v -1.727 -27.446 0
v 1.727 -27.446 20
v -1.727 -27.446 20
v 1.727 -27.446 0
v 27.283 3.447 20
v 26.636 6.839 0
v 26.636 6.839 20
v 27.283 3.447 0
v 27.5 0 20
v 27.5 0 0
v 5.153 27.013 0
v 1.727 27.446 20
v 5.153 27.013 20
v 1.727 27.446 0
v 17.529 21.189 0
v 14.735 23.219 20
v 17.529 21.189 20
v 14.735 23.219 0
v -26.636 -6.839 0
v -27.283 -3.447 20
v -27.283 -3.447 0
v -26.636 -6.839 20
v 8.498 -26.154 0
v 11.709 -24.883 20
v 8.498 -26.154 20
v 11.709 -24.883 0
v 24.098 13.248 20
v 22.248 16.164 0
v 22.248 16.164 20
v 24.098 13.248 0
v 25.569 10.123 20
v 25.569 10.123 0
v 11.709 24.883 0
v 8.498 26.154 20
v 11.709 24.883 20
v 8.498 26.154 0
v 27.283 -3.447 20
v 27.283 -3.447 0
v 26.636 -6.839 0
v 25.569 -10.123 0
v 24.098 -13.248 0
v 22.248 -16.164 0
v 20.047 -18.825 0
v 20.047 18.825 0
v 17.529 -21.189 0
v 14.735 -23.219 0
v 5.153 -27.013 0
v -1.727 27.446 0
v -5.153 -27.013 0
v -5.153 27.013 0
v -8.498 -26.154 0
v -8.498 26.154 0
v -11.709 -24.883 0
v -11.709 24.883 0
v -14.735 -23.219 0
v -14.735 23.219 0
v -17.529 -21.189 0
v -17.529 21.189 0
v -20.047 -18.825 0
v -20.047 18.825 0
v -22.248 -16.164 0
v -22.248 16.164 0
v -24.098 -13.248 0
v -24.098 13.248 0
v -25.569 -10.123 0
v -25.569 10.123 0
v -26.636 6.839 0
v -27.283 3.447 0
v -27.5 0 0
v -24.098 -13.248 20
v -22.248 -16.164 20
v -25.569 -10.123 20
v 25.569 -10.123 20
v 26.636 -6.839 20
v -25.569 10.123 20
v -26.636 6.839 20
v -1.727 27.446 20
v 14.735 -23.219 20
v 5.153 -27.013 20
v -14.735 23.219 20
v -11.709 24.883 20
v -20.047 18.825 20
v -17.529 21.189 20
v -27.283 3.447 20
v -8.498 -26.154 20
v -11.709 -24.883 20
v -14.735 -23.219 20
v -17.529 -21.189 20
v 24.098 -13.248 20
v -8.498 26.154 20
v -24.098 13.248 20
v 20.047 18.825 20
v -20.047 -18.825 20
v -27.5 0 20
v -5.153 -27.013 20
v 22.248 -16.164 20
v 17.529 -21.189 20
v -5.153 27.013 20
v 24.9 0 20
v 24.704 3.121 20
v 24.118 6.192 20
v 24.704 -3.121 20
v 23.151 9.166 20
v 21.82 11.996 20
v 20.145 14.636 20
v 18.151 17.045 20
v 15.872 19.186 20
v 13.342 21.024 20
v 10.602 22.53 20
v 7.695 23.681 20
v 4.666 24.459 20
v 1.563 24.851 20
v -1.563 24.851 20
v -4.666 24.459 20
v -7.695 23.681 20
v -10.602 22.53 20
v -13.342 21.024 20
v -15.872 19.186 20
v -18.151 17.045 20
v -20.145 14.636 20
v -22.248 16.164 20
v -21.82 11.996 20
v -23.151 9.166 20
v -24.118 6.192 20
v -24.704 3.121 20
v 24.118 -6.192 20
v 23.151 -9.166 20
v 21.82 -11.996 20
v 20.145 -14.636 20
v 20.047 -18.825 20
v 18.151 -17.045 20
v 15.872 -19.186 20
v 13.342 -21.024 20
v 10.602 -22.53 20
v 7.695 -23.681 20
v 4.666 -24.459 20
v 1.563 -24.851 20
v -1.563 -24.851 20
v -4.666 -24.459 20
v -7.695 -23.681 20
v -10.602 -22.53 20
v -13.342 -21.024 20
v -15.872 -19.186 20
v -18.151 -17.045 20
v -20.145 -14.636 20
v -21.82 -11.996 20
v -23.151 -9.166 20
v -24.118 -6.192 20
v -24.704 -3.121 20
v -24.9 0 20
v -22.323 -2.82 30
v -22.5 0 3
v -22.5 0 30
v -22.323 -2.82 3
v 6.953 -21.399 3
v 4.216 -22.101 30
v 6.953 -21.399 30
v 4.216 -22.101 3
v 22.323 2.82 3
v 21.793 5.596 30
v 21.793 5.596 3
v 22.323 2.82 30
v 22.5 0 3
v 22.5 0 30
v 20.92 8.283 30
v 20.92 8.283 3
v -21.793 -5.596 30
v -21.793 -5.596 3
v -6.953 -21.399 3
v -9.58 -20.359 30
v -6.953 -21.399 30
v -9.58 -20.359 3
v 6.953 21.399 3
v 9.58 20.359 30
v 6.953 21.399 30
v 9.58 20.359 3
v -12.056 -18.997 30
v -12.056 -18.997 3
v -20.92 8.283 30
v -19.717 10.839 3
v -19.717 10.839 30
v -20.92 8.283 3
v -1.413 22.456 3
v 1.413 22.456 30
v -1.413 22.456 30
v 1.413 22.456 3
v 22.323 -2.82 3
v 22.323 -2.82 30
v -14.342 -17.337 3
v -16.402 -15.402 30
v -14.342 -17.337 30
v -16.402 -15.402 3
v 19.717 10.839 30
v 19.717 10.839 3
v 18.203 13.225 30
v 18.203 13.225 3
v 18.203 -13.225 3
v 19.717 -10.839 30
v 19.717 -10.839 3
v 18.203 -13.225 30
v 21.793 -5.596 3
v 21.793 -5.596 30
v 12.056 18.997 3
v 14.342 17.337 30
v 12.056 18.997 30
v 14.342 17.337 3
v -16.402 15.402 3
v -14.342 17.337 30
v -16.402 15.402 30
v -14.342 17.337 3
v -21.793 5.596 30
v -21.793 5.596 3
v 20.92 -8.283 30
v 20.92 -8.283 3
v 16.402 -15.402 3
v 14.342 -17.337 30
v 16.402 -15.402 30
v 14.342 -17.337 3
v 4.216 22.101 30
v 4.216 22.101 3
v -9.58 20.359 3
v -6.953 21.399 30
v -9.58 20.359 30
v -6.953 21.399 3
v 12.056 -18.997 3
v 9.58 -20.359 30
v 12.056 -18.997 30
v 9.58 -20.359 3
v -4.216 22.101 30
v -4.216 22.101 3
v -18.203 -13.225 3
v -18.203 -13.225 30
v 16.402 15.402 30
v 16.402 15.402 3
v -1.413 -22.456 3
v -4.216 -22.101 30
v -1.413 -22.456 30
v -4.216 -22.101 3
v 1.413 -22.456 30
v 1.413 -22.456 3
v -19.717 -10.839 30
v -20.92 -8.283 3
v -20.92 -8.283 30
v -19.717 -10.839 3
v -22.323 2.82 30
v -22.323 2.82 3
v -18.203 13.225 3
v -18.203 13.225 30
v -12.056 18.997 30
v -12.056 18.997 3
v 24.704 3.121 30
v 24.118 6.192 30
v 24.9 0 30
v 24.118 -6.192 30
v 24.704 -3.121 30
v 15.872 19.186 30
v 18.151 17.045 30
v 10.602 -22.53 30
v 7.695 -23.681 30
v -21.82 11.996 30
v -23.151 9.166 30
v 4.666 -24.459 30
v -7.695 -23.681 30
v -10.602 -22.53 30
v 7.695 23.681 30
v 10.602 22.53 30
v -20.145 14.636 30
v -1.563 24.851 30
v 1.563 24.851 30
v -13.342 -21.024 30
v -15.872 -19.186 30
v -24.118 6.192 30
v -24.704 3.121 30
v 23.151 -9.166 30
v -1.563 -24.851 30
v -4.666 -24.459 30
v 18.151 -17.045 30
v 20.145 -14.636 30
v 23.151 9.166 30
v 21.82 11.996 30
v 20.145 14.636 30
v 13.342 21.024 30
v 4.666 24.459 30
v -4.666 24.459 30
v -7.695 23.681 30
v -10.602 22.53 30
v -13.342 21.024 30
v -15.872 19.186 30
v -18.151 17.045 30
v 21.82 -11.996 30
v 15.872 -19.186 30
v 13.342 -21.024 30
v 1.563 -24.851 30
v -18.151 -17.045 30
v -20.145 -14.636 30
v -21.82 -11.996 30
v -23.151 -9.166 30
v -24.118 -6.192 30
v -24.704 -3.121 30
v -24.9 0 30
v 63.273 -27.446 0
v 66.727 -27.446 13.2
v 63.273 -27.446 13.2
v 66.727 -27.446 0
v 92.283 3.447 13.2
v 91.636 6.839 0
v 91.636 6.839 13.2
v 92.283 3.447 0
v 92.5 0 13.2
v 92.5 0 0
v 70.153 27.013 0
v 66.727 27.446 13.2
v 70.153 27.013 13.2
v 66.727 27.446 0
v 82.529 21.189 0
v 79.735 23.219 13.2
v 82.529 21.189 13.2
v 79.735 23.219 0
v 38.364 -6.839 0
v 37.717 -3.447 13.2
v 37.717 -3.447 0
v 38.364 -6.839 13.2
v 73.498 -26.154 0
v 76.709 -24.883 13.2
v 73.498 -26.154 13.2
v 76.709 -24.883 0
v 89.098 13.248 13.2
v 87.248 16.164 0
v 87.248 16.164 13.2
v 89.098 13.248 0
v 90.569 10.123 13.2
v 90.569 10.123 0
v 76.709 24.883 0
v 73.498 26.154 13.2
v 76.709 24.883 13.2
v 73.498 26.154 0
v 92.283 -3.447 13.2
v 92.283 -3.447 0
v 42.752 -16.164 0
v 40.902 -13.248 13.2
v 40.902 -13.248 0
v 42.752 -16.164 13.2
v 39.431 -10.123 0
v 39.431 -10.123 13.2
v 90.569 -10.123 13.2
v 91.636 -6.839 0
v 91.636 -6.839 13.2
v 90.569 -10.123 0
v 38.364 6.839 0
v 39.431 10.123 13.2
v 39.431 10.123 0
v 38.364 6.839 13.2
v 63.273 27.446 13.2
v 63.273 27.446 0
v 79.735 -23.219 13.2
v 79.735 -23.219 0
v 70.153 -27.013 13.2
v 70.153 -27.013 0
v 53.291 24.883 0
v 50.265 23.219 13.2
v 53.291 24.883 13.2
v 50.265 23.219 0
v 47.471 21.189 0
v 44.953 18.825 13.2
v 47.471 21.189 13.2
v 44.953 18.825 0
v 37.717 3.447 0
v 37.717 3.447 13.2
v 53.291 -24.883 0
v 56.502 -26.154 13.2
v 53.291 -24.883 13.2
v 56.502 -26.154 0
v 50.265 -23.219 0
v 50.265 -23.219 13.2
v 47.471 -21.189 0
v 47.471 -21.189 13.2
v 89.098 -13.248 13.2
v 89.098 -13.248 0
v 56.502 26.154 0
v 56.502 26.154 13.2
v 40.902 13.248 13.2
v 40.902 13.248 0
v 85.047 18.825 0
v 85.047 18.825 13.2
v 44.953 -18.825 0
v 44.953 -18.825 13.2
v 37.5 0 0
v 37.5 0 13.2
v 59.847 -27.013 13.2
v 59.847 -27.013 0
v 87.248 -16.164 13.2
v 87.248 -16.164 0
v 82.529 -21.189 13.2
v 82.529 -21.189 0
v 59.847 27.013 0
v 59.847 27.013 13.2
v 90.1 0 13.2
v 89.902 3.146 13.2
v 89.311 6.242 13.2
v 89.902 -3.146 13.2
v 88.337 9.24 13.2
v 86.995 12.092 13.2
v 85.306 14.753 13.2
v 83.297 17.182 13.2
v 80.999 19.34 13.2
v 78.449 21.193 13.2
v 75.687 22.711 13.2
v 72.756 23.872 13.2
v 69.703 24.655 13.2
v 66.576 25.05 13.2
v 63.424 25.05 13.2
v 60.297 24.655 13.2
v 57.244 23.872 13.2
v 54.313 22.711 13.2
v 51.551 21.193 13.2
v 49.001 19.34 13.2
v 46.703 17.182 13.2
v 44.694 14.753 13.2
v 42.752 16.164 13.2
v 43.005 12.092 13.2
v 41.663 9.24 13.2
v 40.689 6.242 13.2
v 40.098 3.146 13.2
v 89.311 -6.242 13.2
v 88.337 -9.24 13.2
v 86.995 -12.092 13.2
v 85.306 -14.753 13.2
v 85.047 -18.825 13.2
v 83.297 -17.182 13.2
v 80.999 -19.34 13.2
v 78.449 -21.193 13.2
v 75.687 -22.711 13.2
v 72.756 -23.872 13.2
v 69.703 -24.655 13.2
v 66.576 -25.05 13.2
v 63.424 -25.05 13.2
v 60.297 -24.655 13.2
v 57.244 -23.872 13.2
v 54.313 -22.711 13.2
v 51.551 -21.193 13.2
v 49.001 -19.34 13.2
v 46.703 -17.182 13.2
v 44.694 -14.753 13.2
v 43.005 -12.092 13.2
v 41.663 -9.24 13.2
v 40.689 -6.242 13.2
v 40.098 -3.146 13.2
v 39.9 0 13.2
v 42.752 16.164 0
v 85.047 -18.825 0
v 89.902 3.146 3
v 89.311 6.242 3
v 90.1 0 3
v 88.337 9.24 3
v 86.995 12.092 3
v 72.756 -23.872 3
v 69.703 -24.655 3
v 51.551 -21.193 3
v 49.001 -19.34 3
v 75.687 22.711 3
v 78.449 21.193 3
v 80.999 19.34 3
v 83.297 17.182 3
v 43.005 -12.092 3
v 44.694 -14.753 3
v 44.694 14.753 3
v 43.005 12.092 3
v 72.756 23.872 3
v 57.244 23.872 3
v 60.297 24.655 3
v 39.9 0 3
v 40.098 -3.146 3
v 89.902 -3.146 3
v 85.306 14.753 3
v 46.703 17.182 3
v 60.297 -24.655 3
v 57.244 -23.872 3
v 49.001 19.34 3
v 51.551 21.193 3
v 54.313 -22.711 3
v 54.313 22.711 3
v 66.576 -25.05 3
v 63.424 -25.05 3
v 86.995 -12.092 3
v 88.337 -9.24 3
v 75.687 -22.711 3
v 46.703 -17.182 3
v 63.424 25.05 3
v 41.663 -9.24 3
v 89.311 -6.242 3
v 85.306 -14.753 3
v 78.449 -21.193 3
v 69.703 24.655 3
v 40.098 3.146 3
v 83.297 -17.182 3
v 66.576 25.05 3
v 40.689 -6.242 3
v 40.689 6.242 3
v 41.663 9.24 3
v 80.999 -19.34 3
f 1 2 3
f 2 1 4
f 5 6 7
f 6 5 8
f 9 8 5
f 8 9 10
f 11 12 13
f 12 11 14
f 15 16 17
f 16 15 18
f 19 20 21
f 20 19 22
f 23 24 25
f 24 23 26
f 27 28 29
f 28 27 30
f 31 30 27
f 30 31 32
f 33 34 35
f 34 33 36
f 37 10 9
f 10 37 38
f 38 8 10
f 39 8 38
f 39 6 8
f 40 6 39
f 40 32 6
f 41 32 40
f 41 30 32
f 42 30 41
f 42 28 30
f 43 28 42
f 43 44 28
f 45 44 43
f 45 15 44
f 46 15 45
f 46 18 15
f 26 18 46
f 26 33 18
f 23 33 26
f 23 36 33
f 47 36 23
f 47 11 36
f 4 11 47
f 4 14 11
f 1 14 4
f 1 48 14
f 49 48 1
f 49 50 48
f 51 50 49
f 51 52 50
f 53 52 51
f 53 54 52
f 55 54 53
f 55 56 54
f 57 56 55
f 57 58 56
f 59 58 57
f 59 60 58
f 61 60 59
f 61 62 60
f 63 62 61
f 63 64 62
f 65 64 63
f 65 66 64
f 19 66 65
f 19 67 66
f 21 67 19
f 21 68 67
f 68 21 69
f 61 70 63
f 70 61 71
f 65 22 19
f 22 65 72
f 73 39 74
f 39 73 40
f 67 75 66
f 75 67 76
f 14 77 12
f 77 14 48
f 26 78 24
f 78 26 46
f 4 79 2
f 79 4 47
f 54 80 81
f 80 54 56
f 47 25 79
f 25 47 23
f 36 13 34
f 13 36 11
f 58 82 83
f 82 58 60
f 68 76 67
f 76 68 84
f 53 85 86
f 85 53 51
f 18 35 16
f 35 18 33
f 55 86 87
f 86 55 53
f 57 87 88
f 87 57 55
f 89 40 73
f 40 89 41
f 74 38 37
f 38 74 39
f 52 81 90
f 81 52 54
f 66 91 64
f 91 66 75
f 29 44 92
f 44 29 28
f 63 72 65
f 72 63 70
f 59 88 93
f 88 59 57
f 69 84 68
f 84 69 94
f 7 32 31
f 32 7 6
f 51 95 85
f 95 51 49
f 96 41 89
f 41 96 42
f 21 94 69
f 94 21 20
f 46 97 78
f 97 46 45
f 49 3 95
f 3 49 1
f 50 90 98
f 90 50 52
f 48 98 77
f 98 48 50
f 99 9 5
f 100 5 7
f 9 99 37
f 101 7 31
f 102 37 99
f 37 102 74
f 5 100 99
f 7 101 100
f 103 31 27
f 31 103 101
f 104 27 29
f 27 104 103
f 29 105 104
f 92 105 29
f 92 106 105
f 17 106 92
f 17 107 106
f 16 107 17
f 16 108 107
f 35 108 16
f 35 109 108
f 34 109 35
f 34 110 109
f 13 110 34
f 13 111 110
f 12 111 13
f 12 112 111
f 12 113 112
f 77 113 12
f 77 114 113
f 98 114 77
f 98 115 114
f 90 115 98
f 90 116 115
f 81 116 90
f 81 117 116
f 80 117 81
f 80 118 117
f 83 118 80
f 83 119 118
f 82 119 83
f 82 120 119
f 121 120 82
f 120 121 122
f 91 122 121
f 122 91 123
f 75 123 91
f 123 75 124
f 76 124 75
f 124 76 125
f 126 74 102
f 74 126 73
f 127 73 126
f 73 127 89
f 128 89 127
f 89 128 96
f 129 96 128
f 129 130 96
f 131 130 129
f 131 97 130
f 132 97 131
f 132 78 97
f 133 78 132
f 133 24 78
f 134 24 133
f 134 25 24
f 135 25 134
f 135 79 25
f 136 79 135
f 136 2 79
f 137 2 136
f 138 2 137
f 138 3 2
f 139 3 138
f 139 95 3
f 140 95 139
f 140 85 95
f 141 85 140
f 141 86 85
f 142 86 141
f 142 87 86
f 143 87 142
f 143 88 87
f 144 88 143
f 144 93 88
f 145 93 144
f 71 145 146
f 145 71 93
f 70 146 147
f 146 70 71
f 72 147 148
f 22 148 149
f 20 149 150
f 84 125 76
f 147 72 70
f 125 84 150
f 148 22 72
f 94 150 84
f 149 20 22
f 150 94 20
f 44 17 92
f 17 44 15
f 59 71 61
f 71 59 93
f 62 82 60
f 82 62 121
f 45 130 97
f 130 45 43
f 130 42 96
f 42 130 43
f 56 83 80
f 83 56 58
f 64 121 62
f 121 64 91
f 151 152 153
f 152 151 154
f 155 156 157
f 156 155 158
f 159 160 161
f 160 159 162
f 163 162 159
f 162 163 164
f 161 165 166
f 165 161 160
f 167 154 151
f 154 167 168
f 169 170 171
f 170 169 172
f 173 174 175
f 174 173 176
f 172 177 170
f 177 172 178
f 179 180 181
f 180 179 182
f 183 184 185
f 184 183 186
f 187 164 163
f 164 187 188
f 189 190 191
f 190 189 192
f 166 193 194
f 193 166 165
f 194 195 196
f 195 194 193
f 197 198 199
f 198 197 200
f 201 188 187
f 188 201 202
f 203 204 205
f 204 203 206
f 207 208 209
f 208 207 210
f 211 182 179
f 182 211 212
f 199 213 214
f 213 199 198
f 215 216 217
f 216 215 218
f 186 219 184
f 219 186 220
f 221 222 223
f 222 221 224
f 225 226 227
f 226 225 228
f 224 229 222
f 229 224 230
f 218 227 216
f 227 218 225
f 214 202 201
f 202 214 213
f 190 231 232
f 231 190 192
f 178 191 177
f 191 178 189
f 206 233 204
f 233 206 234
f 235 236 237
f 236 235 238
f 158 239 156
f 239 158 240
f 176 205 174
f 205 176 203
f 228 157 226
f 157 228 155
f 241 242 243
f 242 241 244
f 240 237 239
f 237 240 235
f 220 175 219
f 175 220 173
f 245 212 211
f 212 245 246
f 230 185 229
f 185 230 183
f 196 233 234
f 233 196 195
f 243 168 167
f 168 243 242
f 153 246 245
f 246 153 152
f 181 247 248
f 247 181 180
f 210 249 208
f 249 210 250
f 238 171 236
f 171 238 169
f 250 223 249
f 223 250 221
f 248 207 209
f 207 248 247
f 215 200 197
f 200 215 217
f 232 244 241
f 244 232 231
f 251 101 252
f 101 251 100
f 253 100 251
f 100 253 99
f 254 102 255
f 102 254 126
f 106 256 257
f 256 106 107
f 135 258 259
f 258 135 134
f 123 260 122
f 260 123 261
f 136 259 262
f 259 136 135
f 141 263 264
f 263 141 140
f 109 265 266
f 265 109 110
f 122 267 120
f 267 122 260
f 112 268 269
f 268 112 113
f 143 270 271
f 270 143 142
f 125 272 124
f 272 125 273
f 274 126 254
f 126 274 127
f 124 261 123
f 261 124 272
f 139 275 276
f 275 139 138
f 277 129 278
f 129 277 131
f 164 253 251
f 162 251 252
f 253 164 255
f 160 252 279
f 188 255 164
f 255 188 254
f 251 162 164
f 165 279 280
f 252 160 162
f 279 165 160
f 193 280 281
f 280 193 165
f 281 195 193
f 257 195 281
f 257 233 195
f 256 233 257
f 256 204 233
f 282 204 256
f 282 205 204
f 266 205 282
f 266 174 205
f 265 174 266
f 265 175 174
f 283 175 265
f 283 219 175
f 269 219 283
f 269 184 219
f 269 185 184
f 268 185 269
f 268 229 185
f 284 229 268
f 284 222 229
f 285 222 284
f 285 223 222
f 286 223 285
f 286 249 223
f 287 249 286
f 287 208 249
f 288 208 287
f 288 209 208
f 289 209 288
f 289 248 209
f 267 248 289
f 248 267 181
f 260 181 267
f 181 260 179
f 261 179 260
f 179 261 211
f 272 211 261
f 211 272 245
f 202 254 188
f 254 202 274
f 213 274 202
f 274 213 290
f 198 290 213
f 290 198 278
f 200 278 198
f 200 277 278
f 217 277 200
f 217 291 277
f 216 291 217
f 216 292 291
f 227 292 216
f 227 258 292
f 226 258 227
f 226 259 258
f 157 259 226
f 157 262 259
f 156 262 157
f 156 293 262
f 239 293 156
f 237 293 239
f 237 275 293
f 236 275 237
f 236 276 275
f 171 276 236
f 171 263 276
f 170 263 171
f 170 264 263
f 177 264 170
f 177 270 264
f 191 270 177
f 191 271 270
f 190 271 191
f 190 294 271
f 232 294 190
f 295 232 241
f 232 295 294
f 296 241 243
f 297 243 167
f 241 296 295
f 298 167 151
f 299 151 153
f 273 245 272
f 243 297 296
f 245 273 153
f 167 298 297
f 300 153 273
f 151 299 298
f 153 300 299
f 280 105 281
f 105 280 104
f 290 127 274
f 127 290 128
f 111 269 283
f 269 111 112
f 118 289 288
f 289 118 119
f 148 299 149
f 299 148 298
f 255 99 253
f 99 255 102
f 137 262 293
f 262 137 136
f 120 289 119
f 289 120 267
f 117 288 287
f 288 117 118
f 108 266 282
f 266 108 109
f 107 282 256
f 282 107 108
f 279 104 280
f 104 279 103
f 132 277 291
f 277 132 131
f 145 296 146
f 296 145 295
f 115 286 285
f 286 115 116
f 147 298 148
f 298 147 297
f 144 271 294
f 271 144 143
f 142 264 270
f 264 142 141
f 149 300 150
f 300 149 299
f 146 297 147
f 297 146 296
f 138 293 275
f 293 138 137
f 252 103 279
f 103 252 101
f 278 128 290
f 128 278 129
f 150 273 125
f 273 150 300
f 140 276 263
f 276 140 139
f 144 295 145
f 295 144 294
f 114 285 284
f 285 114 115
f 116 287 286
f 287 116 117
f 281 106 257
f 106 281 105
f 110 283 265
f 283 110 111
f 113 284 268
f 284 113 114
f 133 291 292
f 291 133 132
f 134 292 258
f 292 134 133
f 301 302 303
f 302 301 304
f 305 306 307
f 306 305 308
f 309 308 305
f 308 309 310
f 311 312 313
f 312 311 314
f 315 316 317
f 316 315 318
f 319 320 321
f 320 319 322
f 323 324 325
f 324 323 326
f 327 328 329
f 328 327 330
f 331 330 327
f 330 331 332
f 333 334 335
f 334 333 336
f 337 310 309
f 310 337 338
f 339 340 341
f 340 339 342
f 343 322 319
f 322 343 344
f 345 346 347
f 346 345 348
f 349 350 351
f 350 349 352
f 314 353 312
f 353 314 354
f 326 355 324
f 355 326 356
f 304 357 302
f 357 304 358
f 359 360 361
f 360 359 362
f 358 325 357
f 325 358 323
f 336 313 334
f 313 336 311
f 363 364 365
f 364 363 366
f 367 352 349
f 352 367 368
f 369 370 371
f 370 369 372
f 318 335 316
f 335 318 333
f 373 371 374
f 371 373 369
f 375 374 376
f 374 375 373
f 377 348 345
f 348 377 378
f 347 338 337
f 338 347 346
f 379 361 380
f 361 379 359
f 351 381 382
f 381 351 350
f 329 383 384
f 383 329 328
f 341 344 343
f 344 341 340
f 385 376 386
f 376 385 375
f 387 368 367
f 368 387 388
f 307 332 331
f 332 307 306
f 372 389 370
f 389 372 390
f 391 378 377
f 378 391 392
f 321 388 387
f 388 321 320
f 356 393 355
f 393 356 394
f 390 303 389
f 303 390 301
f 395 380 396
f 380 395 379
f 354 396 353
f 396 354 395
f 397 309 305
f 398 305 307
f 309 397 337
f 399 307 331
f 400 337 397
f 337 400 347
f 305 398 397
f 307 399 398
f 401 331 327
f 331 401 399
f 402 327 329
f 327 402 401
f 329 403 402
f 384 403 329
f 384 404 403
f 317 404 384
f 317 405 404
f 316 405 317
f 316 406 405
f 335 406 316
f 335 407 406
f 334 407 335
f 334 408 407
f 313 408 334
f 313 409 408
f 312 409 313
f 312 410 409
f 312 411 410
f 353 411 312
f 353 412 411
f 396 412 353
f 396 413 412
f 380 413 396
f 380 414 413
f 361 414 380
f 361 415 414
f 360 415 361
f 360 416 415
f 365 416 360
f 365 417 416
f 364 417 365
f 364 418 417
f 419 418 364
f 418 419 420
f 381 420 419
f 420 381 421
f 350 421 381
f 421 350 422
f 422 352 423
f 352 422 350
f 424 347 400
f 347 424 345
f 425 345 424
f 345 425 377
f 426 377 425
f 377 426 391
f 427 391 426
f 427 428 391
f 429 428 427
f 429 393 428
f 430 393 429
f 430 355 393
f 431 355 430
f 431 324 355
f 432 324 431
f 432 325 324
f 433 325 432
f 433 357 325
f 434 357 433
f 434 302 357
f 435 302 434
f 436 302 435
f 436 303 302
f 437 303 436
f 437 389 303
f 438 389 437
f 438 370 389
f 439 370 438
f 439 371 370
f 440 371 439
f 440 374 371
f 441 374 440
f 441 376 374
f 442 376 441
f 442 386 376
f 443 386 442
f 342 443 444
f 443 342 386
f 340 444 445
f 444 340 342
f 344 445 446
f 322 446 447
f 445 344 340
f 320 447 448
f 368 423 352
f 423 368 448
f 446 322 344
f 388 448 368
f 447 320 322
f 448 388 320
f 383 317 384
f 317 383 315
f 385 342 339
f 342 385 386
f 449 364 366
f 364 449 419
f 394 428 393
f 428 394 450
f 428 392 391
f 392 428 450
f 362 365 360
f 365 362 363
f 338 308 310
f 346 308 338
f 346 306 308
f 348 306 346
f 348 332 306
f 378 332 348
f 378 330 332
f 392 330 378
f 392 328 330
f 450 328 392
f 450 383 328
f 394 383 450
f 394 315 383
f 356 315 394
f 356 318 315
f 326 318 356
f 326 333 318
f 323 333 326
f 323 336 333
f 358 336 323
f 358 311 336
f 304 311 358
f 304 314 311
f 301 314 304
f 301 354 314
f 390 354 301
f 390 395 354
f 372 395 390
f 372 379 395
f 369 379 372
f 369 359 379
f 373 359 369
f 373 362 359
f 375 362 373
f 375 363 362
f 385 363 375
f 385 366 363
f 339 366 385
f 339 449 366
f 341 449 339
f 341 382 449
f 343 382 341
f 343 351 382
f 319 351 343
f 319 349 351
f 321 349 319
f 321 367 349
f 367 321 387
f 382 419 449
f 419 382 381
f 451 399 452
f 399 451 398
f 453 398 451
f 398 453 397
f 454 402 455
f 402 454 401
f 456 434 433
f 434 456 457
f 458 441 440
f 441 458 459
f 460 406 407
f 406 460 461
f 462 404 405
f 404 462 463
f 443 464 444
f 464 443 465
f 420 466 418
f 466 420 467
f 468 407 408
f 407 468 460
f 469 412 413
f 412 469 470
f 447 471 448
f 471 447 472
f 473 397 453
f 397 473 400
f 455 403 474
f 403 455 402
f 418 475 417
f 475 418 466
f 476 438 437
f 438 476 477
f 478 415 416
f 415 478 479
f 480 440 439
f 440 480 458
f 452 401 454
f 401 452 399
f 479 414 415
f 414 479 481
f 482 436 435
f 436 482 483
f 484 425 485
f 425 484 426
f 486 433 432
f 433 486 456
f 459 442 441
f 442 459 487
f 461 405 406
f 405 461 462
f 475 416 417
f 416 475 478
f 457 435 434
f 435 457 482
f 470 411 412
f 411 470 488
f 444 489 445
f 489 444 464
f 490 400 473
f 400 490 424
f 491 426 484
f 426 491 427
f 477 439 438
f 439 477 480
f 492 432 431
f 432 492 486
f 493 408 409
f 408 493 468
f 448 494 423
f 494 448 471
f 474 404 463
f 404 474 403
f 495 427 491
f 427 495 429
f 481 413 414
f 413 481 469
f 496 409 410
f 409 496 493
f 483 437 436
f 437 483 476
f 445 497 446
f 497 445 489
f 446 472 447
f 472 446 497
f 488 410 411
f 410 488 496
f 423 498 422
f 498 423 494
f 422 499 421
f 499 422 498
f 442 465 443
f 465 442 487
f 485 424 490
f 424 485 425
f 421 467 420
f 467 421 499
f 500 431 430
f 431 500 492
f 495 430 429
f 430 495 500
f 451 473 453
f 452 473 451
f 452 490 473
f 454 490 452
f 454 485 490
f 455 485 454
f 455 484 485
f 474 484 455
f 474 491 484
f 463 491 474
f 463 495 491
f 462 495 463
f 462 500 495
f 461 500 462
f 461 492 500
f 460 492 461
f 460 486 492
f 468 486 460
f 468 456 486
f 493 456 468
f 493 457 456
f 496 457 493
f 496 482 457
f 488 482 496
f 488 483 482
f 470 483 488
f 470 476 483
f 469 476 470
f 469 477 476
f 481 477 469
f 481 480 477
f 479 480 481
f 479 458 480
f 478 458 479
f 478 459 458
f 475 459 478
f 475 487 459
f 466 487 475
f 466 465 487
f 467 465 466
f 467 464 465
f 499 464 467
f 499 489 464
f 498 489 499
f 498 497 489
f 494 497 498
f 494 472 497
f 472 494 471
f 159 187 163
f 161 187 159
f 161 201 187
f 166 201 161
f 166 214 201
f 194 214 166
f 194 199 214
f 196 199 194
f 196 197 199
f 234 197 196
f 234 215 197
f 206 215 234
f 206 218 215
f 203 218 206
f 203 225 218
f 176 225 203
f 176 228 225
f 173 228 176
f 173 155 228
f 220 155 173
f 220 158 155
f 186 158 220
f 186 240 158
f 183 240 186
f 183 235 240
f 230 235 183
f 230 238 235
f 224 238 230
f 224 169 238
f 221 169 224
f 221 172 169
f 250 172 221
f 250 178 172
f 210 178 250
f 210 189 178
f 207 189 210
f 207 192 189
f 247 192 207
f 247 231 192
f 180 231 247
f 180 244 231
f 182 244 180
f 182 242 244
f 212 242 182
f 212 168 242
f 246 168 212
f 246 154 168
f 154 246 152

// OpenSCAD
/*
***Customizable Round Box***
K.Incekara
Jul 4, 2019
*/

/////Parameters/////
// Inside diameter of the box (mm).
ins_dia = 45;
// Wall thickness (mm).
wall_th = 5;
// Top-bottom thickness (mm).
tb_th = 3;
// Outside diameter of the box (mm).
out_dia = ins_dia + 2*wall_th;
// Height of the box from bottom to cover (mm).
h = 20;
// Height of the intersection of the body and the cover (mm).
insc = 10;
// Clerance between the cover and the box (mm).
clr = 0.2; //[0.05,0.1,0.2,0.3,0.4]                     

/////Box/////
difference(){
    cylinder(h, out_dia /2 , out_dia /2, $fn=50);
    cylinder(h+1, ins_dia /2 , ins_dia /2, $fn=50 );
}
difference(){
    cylinder(h+insc, (ins_dia+wall_th-clr)/2, (ins_dia+wall_th-clr)/2, $fn=50);
    cylinder(h+insc+1, ins_dia /2 , ins_dia /2, $fn=50 );
}
cylinder(tb_th, ins_dia /2 , ins_dia /2, $fn=50 ); //bottom

//Cover//
translate([out_dia+10,0,0]){
difference(){
    cylinder(insc+tb_th+clr, out_dia/2, out_dia/2, $fn=50);
    cylinder(insc+tb_th+1, (ins_dia+wall_th+clr)/2, (ins_dia+wall_th+clr)/2, $fn=50 );
}
cylinder(tb_th, out_dia/2 , out_dia/2, $fn=50 ); //top
}
